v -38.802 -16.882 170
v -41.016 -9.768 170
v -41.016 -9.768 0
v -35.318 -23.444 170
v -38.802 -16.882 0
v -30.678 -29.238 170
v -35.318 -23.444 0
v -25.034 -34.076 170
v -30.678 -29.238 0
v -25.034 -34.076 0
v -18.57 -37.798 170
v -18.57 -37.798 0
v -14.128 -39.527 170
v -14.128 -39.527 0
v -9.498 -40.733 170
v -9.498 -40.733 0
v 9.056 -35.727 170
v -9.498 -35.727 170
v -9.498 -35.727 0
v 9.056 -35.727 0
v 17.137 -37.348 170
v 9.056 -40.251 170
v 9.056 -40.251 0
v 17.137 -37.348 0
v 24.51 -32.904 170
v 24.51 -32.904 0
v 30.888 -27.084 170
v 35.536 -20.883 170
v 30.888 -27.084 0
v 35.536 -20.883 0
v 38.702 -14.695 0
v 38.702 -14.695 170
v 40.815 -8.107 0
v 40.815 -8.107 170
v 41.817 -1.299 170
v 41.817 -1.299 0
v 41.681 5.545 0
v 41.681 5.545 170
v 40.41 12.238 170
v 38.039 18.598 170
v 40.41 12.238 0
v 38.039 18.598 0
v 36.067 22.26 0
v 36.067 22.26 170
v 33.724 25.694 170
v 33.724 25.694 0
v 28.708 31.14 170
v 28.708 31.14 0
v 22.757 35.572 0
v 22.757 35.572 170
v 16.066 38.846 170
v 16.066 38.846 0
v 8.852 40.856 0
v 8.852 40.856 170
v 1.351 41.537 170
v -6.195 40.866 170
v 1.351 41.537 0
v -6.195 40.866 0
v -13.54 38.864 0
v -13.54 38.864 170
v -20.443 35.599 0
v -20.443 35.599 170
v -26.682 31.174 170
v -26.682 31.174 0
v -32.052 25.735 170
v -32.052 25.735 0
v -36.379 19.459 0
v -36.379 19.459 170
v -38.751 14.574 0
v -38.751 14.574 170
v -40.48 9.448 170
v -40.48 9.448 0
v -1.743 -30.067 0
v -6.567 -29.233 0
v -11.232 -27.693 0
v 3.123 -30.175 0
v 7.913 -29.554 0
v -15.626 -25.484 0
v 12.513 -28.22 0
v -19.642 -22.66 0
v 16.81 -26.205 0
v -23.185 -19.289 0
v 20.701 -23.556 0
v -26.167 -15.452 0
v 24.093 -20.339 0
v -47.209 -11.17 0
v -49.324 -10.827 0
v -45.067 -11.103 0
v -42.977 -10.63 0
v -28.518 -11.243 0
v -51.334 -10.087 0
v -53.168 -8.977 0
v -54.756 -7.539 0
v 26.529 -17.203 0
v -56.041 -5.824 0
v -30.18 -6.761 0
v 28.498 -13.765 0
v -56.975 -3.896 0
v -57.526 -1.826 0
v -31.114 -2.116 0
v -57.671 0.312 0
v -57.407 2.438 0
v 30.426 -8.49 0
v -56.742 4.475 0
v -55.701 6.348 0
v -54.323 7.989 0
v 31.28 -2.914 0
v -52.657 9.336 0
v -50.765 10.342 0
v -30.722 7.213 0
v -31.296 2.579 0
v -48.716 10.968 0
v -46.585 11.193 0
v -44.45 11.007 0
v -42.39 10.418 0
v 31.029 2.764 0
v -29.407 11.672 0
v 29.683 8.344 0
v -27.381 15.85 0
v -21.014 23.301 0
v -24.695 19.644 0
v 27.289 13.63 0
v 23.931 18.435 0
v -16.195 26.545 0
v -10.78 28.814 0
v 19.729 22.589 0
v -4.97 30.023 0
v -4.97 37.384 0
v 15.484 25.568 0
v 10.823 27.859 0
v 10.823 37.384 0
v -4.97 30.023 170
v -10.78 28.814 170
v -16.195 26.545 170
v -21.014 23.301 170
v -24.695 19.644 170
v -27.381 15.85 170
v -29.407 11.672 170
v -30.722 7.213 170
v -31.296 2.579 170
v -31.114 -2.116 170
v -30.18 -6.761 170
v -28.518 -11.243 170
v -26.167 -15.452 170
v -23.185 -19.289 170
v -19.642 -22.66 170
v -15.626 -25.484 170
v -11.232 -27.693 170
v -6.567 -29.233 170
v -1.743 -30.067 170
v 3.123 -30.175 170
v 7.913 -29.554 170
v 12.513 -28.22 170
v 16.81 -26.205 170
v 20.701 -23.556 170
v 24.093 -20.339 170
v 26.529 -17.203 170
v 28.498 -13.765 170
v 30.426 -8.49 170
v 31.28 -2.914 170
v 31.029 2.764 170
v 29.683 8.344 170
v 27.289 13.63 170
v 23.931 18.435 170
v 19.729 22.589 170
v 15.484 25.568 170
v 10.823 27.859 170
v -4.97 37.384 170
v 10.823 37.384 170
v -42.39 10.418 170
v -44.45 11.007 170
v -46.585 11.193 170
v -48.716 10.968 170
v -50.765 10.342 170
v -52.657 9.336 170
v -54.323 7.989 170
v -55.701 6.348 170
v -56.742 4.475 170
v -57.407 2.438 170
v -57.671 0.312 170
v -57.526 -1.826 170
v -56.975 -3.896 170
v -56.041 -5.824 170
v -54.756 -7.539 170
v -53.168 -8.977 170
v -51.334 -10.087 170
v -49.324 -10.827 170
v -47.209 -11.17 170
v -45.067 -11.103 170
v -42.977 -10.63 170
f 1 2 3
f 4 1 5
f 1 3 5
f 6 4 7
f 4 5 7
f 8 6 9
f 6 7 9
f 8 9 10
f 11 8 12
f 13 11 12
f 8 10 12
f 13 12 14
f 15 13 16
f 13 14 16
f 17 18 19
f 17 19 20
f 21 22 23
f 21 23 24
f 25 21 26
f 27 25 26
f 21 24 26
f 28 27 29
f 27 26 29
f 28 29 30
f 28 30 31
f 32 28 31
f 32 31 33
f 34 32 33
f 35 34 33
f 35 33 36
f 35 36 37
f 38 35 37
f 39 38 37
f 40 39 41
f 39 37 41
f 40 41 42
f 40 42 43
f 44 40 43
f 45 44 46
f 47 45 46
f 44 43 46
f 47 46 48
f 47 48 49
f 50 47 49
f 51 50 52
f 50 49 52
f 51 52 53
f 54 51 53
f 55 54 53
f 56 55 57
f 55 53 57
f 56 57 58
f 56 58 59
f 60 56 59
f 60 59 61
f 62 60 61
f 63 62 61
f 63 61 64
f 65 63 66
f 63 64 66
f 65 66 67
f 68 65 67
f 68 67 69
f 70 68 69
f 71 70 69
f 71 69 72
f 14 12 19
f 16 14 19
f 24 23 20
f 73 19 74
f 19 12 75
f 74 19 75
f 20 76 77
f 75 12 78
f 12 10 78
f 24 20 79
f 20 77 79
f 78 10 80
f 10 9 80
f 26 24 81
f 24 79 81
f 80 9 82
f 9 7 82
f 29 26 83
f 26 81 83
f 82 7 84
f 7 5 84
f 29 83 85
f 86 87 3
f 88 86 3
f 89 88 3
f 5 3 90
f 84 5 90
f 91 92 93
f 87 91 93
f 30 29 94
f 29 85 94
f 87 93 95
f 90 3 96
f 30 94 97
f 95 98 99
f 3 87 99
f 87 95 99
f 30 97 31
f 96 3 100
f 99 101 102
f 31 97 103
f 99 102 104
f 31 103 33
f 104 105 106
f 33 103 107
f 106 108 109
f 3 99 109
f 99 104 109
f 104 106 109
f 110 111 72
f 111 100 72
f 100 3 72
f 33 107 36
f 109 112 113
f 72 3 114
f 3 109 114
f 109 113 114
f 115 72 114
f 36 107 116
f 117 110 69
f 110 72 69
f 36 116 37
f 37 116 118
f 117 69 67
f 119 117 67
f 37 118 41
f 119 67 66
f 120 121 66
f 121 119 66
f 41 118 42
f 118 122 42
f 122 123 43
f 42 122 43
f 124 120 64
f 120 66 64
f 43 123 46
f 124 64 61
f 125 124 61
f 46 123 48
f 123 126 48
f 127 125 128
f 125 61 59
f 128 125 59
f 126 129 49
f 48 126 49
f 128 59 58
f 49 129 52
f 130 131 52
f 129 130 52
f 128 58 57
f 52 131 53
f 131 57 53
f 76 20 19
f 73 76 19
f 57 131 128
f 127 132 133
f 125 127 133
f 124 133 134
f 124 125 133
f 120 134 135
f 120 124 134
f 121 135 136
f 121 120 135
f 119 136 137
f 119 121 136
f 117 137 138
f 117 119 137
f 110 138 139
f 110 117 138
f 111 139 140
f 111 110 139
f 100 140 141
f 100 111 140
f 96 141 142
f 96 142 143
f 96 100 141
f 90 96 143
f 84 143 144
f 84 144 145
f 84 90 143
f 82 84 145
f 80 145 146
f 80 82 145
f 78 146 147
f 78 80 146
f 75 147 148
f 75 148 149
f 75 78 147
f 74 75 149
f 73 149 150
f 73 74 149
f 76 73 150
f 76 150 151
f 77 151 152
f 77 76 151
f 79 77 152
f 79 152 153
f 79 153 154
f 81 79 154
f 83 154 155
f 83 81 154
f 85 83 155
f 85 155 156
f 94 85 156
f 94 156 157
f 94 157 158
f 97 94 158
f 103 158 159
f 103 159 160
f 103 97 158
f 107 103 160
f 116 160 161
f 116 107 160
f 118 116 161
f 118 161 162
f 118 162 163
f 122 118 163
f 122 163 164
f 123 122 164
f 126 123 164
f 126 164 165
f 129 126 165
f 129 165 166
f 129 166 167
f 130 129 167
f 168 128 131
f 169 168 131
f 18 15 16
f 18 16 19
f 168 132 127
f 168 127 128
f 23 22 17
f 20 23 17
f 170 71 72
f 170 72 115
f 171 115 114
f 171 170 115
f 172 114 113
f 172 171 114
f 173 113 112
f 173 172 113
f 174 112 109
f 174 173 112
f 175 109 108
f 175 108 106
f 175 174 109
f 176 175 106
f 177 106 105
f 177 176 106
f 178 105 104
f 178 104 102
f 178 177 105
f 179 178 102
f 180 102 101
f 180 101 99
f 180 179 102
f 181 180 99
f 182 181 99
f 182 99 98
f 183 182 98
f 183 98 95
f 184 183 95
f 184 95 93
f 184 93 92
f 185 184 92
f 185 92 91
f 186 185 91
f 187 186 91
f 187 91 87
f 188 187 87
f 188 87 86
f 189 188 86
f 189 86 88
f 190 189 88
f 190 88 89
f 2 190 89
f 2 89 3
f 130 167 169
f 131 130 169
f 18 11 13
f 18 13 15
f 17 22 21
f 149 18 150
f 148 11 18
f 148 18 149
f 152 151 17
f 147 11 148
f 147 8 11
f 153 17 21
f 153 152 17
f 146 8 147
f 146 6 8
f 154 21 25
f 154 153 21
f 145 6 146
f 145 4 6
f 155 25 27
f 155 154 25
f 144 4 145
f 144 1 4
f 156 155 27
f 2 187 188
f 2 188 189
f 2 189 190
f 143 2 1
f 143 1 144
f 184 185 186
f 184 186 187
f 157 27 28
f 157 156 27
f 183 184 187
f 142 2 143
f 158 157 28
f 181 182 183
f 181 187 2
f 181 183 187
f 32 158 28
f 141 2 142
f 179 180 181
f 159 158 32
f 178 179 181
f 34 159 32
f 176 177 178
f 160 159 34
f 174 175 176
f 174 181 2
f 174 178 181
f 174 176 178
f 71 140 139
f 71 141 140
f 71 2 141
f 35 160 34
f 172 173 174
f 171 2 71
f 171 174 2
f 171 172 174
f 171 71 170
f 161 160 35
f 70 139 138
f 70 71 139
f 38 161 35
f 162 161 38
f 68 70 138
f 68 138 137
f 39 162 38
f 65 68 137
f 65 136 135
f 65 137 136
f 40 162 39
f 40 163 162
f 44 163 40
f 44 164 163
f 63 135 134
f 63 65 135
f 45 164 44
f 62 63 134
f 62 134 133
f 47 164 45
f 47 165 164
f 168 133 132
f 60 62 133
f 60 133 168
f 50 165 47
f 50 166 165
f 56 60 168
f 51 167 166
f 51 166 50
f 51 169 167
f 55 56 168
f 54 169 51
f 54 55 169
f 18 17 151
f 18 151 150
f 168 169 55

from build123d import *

# Parameters (mm, degrees)
ESQUISSE1_RX            = 42.396864719
ESQUISSE1_RY            = 41.029112223
ESQUISSE1_RX_2          = 31.648634461
ESQUISSE1_RY_2          = 29.877092437
BOSS_EXTRU_1_DEPTH      = 170
ESQUISSE2_W             = 15.792738377
ESQUISSE2_H             = 16.344932025
ESQUISSE2_W_2           = 18.553706624
ESQUISSE2_H_2           = 11.816944099
ENL_V_MAT_EXTRU_1_DEPTH = 170
ESQUISSE3_R             = 11.193216681
BOSS_EXTRU_2_DEPTH      = 170


with BuildPart() as part:
    # Esquisse1 → Boss.-Extru.1 (new body)
    with BuildSketch(Plane.XY):
        with Locations(Location((0, 0), (0, 0, 37.303948278))):
            Ellipse(ESQUISSE1_RX, ESQUISSE1_RY)
        with Locations(Location((0, 0), (0, 0, -25.781336929))):
            Ellipse(ESQUISSE1_RX_2, ESQUISSE1_RY_2, mode=Mode.SUBTRACT)
    extrude(amount=BOSS_EXTRU_1_DEPTH)

    # Esquisse2 → Enlèv. mat.-Extru.1 (cut)
    with BuildSketch(Plane.XY.offset(170)):
        with Locations((2.926626343, 29.21104406)):
            Rectangle(ESQUISSE2_W, ESQUISSE2_H)
        with Locations((-0.22087746, -41.635401174)):
            Rectangle(ESQUISSE2_W_2, ESQUISSE2_H_2)
    extrude(amount=-ENL_V_MAT_EXTRU_1_DEPTH, mode=Mode.SUBTRACT)

    # Esquisse3 → Boss.-Extru.2 (add)
    with BuildSketch(Plane.XY.offset(170)):
        with Locations((-46.482294325, 0)):
            Circle(ESQUISSE3_R)
    extrude(amount=-BOSS_EXTRU_2_DEPTH)


solid = part.part
